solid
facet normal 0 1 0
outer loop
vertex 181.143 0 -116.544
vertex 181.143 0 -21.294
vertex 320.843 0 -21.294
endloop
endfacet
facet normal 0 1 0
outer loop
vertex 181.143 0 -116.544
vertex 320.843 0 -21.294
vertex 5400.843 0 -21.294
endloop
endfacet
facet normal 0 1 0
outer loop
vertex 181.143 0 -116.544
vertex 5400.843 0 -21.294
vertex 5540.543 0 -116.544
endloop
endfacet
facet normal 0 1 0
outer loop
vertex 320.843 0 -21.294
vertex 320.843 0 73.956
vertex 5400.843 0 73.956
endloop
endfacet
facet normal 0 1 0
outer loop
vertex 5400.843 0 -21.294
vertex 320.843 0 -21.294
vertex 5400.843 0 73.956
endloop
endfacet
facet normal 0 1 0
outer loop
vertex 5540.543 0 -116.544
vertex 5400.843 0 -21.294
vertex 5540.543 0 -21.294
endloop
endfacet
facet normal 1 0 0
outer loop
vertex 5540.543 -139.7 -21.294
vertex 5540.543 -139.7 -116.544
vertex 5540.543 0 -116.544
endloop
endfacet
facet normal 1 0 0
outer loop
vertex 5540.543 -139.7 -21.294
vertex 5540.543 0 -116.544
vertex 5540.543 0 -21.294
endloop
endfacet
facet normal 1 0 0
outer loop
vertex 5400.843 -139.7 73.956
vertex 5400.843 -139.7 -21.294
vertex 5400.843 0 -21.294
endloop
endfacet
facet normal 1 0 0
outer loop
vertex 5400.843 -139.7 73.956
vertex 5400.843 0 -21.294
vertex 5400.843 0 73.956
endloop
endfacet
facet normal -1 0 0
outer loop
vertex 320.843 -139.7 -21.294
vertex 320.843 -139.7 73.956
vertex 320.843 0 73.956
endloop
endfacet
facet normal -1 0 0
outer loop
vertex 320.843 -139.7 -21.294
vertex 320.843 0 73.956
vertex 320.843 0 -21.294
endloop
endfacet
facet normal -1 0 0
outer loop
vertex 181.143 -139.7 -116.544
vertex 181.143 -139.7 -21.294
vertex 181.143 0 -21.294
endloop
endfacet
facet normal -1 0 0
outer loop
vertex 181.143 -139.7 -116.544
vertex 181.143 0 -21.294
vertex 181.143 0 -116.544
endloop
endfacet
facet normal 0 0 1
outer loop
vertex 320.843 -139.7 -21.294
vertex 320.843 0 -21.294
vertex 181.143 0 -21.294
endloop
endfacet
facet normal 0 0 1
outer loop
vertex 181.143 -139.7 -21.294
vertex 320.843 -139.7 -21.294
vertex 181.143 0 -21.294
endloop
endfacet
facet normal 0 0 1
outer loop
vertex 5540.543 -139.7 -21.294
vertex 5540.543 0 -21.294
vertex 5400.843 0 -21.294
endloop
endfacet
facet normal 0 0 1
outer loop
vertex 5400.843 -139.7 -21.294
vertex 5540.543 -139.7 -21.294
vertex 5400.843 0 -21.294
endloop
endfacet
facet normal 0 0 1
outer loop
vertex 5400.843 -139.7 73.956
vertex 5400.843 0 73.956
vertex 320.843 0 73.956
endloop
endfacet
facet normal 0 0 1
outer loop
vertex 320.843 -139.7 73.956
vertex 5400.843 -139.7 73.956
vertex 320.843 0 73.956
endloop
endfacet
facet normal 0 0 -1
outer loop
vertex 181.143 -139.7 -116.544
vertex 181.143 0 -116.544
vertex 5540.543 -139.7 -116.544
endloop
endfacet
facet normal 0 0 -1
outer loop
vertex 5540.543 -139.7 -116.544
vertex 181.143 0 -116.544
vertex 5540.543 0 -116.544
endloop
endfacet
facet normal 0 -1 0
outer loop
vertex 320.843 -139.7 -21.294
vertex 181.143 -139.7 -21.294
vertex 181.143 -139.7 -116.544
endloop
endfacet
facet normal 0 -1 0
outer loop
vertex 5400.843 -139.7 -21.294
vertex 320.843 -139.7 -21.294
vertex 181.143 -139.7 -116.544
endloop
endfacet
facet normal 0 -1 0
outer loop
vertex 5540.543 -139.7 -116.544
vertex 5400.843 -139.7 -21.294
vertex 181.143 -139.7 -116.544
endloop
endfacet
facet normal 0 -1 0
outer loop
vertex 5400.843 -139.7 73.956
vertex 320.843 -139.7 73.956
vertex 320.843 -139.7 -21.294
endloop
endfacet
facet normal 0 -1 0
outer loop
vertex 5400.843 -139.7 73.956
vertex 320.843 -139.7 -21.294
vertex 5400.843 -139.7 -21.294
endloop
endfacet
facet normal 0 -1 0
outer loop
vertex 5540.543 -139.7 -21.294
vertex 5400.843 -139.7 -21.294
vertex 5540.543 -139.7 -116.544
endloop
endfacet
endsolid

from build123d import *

# Parameters (mm, degrees)
F0_W     = 139.7
F0_H     = 95.25
F1_DEPTH = 139.7


with BuildPart() as f1:
    # F0 (on Front) → F1 (new body)
    with BuildSketch(Plane.XZ):
        Polygon((181.143059, -21.294381), (181.143059, -116.544381), (2860.843059, -116.544381), (5540.543059, -116.544381), (5540.543059, -21.294381), (5400.843059, -21.294381), (5400.843059, 73.955619), (2930.693059, 73.955619), (2930.693059, -21.294381), (2790.993059, -21.294381), (2790.993059, 73.955619), (320.843059, 73.955619), (320.843059, -21.294381), align=None)
        with Locations((2860.843059, 26.330619)):
            Rectangle(F0_W, F0_H)
    extrude(amount=F1_DEPTH)


solid = f1.part
